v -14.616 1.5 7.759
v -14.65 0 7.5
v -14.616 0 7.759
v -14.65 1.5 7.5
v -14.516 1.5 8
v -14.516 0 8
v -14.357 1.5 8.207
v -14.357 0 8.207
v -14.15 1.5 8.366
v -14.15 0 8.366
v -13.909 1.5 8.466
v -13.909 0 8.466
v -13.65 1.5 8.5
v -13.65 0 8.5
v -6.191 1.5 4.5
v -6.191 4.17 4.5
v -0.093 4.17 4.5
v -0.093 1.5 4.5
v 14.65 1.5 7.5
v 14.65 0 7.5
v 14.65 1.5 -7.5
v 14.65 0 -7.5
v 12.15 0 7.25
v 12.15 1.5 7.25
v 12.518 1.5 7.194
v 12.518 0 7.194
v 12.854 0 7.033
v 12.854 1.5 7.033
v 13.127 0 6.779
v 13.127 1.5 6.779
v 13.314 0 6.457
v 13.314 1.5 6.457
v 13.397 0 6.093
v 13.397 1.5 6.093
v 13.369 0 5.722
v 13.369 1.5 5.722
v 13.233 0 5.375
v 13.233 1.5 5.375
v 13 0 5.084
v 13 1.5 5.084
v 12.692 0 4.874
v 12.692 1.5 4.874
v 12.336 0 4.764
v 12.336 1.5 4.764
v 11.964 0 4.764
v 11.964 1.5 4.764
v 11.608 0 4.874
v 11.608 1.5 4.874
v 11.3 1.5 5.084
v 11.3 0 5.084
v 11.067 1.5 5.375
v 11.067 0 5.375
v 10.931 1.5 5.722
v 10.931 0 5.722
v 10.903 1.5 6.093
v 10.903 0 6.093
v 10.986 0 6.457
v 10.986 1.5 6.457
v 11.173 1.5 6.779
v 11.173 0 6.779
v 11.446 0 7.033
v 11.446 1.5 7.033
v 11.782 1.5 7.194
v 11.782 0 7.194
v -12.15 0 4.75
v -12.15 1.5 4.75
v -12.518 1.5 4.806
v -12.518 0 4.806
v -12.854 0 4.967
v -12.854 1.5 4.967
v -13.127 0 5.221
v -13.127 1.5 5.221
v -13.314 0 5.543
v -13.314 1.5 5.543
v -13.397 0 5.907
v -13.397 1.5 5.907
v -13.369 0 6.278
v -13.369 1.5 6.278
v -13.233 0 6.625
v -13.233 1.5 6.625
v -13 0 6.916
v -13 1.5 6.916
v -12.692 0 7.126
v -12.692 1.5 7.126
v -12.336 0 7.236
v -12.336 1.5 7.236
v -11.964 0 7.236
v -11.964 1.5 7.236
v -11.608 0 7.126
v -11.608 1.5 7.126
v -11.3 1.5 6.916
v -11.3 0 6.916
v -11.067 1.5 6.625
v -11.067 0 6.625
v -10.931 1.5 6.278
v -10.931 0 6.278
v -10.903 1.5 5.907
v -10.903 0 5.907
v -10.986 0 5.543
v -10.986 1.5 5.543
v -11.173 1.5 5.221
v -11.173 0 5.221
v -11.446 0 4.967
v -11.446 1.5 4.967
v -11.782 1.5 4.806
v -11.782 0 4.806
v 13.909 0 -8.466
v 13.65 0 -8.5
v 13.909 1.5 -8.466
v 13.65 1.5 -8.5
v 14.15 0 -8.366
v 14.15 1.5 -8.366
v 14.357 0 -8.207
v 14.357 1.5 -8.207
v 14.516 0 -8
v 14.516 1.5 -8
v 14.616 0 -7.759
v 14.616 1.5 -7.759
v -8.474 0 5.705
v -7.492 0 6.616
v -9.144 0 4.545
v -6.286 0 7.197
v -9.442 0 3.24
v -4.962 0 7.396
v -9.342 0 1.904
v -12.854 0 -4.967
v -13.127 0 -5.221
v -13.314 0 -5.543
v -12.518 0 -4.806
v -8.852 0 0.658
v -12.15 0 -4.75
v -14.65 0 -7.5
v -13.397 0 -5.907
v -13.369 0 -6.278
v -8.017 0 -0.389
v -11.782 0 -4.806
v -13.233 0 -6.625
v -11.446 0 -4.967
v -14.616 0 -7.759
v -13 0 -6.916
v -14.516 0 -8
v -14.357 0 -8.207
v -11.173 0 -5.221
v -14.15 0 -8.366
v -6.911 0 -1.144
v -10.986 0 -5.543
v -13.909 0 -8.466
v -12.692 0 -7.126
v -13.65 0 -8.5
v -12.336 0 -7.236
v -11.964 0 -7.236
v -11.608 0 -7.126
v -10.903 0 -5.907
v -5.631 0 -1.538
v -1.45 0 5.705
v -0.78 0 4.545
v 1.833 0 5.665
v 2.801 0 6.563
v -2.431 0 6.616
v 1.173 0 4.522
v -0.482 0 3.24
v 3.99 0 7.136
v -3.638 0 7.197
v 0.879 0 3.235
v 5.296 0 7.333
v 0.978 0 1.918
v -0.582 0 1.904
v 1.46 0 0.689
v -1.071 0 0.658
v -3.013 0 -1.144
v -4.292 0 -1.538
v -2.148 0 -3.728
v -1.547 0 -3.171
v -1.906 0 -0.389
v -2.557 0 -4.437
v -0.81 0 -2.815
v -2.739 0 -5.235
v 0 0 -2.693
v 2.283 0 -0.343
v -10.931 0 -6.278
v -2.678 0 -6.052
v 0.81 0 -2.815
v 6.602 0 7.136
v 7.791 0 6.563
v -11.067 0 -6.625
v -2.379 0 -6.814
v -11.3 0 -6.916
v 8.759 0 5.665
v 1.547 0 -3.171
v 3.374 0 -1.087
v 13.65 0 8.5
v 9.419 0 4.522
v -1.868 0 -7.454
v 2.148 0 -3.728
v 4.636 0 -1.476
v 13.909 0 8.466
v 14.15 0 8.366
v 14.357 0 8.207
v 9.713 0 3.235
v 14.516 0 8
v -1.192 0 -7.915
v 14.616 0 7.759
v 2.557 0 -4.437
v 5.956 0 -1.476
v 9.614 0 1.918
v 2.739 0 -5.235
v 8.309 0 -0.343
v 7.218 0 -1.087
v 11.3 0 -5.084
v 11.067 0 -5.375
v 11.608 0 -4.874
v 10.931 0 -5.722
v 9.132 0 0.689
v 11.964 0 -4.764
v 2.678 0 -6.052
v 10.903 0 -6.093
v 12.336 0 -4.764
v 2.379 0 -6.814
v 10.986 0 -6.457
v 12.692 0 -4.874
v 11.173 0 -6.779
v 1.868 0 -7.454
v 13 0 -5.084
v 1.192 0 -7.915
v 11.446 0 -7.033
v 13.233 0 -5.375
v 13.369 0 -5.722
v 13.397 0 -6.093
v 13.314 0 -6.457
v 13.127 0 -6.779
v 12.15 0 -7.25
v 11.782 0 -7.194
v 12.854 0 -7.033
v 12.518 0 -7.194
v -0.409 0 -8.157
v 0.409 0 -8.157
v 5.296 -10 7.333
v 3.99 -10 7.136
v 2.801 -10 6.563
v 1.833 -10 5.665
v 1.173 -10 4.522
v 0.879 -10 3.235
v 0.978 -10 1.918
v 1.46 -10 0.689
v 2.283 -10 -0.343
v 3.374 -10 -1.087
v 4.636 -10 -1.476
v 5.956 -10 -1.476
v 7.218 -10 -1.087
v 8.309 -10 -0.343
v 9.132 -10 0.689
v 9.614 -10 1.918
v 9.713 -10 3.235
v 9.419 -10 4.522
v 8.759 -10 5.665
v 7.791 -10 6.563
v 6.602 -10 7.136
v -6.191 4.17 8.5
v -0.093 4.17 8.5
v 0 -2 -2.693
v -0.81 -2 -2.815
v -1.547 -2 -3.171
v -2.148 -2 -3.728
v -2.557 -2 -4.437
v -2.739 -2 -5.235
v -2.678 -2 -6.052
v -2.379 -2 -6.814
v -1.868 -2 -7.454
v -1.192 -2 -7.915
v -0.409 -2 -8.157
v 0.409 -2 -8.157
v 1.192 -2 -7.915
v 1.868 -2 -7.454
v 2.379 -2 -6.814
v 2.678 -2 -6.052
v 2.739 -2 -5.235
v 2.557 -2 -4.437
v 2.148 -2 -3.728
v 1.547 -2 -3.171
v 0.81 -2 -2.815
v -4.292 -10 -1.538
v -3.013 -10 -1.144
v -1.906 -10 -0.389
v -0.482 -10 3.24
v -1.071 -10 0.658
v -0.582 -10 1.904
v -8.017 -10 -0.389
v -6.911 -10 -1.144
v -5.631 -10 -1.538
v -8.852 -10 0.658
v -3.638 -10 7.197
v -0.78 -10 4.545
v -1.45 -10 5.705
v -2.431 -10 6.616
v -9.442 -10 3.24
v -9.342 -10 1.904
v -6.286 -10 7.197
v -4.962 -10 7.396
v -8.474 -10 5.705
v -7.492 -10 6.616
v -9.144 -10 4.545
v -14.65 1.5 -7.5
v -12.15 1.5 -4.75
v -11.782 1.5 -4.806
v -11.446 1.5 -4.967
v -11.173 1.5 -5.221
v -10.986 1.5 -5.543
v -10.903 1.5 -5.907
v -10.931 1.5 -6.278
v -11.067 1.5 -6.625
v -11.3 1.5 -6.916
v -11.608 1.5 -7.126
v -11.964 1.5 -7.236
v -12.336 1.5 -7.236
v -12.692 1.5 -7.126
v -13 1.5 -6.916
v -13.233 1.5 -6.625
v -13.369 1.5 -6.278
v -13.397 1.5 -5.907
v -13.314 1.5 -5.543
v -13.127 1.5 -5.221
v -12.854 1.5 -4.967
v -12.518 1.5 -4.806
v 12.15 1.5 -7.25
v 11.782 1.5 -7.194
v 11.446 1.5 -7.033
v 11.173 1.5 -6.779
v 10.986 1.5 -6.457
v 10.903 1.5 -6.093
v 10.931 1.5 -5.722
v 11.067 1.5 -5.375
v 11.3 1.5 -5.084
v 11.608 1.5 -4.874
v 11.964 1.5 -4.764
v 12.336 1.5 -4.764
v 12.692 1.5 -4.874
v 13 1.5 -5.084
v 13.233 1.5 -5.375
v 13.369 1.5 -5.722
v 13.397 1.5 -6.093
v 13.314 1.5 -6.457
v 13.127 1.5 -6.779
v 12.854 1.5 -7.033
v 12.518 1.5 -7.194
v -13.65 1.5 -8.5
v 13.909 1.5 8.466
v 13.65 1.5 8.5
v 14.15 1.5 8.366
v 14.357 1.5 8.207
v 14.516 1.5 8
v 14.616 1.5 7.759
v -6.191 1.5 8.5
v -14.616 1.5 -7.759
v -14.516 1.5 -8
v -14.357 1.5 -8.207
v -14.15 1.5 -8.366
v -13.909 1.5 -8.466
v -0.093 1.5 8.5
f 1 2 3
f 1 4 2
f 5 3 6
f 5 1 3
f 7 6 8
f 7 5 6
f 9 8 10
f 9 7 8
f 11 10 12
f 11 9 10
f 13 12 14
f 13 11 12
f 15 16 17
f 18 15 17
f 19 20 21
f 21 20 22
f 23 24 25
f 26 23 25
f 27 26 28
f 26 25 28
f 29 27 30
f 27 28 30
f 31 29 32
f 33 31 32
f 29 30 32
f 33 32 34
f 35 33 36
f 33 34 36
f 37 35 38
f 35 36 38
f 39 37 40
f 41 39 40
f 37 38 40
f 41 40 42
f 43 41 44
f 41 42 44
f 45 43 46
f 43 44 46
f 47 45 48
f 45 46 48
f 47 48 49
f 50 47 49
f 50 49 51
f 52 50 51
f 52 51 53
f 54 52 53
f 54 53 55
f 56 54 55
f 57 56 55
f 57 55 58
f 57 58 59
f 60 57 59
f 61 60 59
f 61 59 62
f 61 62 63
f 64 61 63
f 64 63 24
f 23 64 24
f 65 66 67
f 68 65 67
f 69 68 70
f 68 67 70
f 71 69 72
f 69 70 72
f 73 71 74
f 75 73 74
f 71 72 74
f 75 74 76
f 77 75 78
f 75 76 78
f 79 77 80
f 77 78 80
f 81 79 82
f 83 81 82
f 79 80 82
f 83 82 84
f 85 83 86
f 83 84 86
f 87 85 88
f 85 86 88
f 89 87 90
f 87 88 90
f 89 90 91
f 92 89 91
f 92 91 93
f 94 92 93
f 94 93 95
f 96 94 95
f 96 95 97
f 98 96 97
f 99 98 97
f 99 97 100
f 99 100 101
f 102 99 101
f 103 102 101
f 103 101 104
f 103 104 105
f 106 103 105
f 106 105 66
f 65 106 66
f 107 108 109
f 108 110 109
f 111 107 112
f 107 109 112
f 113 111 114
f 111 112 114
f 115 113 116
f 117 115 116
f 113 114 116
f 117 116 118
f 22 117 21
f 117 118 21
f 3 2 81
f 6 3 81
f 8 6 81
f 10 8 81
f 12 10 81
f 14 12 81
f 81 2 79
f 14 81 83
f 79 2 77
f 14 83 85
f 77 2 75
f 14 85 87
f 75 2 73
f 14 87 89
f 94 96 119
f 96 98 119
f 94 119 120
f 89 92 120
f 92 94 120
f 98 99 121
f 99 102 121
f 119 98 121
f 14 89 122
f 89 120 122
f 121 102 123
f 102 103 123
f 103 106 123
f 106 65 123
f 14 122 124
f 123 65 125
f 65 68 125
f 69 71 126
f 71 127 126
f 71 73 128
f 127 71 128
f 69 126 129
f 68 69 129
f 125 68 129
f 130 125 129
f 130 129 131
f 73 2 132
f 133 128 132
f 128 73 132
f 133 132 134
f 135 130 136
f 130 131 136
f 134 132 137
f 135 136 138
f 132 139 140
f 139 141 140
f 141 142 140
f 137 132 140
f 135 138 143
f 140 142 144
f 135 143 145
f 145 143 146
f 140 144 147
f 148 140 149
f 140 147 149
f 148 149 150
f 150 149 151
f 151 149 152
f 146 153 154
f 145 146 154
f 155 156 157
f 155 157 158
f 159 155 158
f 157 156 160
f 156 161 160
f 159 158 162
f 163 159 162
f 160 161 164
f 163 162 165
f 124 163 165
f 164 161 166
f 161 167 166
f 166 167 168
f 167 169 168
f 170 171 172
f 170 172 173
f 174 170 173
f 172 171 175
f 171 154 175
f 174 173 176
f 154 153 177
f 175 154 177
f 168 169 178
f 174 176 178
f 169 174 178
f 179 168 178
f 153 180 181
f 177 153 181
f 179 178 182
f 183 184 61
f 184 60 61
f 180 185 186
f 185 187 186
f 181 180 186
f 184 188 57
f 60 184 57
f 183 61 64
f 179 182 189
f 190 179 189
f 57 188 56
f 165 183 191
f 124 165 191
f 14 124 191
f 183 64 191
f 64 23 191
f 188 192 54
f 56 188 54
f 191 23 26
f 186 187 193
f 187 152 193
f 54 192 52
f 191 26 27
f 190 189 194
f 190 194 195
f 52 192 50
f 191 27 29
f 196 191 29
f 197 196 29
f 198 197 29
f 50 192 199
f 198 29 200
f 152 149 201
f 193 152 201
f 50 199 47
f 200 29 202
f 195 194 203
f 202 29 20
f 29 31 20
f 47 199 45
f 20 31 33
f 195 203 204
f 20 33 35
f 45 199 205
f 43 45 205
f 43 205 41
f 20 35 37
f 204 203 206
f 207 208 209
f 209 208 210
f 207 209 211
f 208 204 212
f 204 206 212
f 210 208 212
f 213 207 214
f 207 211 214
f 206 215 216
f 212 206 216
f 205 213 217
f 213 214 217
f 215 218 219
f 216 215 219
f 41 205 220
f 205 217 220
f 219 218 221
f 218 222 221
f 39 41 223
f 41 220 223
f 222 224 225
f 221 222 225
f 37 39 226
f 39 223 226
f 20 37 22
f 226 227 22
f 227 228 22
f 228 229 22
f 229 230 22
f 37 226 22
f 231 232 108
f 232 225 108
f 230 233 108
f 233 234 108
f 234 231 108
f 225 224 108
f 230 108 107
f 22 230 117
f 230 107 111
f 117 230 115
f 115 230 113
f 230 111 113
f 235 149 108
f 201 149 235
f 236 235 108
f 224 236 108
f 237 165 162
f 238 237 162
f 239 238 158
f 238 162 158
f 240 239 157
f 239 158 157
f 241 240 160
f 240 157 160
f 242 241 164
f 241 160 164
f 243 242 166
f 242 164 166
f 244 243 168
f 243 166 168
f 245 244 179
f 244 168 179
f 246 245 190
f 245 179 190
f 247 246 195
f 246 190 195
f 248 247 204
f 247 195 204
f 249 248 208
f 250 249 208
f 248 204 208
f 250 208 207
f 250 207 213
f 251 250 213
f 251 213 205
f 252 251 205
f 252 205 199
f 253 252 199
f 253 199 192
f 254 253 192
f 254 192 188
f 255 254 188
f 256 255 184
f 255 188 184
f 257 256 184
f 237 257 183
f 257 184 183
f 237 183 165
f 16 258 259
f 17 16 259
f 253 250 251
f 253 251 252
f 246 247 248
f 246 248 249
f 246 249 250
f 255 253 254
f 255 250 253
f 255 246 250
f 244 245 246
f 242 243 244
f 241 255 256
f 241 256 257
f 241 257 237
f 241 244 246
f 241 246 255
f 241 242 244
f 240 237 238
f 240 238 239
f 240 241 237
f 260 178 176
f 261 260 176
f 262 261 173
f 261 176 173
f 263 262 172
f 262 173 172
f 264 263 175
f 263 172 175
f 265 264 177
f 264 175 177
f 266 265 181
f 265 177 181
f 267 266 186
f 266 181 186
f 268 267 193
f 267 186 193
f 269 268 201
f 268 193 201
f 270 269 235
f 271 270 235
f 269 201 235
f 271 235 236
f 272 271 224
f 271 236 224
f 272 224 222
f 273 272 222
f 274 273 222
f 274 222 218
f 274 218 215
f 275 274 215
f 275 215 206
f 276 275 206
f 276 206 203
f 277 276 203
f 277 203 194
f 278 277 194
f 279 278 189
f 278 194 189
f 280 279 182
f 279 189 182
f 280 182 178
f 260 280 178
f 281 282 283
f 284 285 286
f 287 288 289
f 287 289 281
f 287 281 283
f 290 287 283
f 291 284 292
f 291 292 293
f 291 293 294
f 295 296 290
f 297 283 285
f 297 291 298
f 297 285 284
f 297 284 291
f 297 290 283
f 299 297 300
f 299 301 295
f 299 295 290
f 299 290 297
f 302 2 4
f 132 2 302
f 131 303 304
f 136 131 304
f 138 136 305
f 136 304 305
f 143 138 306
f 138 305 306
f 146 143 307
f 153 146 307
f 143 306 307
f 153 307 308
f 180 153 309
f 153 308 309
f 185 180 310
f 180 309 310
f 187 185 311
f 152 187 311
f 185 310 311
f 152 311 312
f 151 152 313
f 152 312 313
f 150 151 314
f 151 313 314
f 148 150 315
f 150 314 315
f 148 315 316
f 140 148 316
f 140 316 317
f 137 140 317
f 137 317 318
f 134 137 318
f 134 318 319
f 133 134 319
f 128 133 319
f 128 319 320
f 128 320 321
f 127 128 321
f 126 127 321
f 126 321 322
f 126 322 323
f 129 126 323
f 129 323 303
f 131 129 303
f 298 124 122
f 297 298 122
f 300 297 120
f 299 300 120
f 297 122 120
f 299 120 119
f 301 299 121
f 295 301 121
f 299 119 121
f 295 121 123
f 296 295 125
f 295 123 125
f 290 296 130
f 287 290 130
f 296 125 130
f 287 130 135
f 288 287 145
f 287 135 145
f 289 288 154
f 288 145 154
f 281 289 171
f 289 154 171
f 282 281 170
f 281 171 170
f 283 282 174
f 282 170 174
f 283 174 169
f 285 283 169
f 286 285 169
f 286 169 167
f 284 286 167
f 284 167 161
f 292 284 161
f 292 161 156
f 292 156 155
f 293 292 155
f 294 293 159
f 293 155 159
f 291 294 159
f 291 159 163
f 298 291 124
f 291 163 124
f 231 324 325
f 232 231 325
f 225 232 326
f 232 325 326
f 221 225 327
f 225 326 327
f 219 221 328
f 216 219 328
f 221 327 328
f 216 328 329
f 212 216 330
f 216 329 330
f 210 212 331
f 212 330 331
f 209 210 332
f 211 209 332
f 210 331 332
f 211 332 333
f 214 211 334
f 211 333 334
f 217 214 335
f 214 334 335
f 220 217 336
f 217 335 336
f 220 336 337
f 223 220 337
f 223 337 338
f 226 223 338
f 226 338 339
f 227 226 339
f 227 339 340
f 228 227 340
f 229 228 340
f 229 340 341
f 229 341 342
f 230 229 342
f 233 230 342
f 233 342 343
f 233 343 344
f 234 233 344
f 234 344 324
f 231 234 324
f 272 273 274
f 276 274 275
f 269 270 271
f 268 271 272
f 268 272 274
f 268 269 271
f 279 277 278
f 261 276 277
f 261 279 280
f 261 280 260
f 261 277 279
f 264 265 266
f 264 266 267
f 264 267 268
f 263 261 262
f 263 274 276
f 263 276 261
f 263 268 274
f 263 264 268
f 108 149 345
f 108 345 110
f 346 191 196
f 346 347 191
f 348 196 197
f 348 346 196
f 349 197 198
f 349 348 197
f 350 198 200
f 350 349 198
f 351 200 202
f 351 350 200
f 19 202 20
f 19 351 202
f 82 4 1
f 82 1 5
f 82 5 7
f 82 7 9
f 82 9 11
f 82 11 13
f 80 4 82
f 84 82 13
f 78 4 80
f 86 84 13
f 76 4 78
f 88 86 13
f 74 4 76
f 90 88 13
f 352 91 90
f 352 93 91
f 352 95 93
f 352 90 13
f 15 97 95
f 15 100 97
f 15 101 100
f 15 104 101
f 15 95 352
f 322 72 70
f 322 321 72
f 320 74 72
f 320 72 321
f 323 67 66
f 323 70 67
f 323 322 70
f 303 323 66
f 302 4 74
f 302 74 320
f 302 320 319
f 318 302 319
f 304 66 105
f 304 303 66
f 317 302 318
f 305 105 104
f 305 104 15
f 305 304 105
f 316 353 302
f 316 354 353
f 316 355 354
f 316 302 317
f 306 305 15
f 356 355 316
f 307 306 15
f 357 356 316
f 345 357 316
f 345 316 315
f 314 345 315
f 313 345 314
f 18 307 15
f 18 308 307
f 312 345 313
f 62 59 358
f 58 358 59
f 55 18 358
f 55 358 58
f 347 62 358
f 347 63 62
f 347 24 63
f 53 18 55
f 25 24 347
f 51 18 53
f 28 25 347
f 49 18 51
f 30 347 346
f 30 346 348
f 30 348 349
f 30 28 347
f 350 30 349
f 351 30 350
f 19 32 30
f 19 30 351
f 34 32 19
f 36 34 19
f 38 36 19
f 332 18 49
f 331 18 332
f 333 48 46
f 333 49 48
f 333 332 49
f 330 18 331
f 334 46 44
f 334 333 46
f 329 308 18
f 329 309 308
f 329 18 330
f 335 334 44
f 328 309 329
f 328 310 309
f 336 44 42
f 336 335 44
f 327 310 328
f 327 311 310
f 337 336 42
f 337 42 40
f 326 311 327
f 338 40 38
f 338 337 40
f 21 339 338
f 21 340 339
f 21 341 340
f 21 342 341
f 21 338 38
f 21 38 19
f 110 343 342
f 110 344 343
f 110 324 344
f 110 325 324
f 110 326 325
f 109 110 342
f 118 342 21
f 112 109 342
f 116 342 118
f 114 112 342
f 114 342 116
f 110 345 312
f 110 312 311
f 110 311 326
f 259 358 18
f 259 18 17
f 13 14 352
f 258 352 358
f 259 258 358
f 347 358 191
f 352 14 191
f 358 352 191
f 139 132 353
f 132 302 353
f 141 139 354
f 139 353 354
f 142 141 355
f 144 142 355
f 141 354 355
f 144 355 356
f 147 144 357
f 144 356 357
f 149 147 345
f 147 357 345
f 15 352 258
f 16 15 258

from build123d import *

# Parameters (mm, degrees)
SKETCH_1_W          = 29.3
SKETCH_1_H          = 17
EXTRUDE_1_DEPTH     = 1.5
SKETCH_2_R          = 1.25
CUT_EXTRUDE_1_DEPTH = 18.003602559
SKETCH_4_W          = 6.098514982
SKETCH_4_H          = 2.670072728
EXTRUDE_2_DEPTH     = 4
SKETCH_5_R          = 4.492338227
SKETCH_5_R_2        = 4.429267197
EXTRUDE_3_DEPTH     = 10
SKETCH_6_R          = 2.746946082
EXTRUDE_4_DEPTH     = 2
FILLET_1_R          = 1


with BuildPart() as part:
    # 草图1 → 凸台-拉伸1 (new body)
    with BuildSketch(Plane(origin=(0, 0, 0), x_dir=(1, 0, 0), z_dir=(0, 1, 0))):
        Rectangle(SKETCH_1_W, SKETCH_1_H)
    extrude(amount=EXTRUDE_1_DEPTH)

    # 草图2 → 切除-拉伸1 (cut, through all)
    with BuildSketch(Plane(origin=(0, 1.5, 0), x_dir=(1, 0, 0), z_dir=(0, 1, 0))):
        with Locations(Location((-12.15, 6, 0), (0, 0, 270))):
            Circle(SKETCH_2_R)
        with Locations(Location((12.15, 6, 0), (0, 0, 90))):
            Circle(SKETCH_2_R)
        with Locations(Location((12.15, -6, 0), (0, 0, 270))):
            Circle(SKETCH_2_R)
        with Locations(Location((-12.15, -6, 0), (0, 0, 90))):
            Circle(SKETCH_2_R)
    extrude(amount=-CUT_EXTRUDE_1_DEPTH, mode=Mode.SUBTRACT)

    # 草图4 → 凸台-拉伸2 (add)
    with BuildSketch(Plane.XY.offset(8.5)):
        with Locations((-3.14217972, 2.835036364)):
            Rectangle(SKETCH_4_W, SKETCH_4_H)
    extrude(amount=-EXTRUDE_2_DEPTH)

    # 草图5 → 凸台-拉伸3 (add)
    with BuildSketch(Plane.XZ):
        with Locations(Location((-4.961846609, 2.903857851, 0), (0, 0, 90))):
            Circle(SKETCH_5_R)
        with Locations(Location((5.295992796, 2.903857851, 0), (0, 0, 90))):
            Circle(SKETCH_5_R_2)
    extrude(amount=EXTRUDE_3_DEPTH)

    # 草图6 → 凸台-拉伸4 (add)
    with BuildSketch(Plane.XZ):
        with Locations(Location((0, -5.440327707, 0), (0, 0, 90))):
            Circle(SKETCH_6_R)
    extrude(amount=EXTRUDE_4_DEPTH)

    # 圆角1
    fillet_1_edges = [part.edges().sort_by_distance(p)[0] for p in [
        (14.65, 0.75, 8.5),
        (-14.65, 0.75, 8.5),
        (-14.65, 0.75, -8.5),
        (14.65, 0.75, -8.5),
    ]]
    fillet(fillet_1_edges, radius=FILLET_1_R)


solid = part.part
